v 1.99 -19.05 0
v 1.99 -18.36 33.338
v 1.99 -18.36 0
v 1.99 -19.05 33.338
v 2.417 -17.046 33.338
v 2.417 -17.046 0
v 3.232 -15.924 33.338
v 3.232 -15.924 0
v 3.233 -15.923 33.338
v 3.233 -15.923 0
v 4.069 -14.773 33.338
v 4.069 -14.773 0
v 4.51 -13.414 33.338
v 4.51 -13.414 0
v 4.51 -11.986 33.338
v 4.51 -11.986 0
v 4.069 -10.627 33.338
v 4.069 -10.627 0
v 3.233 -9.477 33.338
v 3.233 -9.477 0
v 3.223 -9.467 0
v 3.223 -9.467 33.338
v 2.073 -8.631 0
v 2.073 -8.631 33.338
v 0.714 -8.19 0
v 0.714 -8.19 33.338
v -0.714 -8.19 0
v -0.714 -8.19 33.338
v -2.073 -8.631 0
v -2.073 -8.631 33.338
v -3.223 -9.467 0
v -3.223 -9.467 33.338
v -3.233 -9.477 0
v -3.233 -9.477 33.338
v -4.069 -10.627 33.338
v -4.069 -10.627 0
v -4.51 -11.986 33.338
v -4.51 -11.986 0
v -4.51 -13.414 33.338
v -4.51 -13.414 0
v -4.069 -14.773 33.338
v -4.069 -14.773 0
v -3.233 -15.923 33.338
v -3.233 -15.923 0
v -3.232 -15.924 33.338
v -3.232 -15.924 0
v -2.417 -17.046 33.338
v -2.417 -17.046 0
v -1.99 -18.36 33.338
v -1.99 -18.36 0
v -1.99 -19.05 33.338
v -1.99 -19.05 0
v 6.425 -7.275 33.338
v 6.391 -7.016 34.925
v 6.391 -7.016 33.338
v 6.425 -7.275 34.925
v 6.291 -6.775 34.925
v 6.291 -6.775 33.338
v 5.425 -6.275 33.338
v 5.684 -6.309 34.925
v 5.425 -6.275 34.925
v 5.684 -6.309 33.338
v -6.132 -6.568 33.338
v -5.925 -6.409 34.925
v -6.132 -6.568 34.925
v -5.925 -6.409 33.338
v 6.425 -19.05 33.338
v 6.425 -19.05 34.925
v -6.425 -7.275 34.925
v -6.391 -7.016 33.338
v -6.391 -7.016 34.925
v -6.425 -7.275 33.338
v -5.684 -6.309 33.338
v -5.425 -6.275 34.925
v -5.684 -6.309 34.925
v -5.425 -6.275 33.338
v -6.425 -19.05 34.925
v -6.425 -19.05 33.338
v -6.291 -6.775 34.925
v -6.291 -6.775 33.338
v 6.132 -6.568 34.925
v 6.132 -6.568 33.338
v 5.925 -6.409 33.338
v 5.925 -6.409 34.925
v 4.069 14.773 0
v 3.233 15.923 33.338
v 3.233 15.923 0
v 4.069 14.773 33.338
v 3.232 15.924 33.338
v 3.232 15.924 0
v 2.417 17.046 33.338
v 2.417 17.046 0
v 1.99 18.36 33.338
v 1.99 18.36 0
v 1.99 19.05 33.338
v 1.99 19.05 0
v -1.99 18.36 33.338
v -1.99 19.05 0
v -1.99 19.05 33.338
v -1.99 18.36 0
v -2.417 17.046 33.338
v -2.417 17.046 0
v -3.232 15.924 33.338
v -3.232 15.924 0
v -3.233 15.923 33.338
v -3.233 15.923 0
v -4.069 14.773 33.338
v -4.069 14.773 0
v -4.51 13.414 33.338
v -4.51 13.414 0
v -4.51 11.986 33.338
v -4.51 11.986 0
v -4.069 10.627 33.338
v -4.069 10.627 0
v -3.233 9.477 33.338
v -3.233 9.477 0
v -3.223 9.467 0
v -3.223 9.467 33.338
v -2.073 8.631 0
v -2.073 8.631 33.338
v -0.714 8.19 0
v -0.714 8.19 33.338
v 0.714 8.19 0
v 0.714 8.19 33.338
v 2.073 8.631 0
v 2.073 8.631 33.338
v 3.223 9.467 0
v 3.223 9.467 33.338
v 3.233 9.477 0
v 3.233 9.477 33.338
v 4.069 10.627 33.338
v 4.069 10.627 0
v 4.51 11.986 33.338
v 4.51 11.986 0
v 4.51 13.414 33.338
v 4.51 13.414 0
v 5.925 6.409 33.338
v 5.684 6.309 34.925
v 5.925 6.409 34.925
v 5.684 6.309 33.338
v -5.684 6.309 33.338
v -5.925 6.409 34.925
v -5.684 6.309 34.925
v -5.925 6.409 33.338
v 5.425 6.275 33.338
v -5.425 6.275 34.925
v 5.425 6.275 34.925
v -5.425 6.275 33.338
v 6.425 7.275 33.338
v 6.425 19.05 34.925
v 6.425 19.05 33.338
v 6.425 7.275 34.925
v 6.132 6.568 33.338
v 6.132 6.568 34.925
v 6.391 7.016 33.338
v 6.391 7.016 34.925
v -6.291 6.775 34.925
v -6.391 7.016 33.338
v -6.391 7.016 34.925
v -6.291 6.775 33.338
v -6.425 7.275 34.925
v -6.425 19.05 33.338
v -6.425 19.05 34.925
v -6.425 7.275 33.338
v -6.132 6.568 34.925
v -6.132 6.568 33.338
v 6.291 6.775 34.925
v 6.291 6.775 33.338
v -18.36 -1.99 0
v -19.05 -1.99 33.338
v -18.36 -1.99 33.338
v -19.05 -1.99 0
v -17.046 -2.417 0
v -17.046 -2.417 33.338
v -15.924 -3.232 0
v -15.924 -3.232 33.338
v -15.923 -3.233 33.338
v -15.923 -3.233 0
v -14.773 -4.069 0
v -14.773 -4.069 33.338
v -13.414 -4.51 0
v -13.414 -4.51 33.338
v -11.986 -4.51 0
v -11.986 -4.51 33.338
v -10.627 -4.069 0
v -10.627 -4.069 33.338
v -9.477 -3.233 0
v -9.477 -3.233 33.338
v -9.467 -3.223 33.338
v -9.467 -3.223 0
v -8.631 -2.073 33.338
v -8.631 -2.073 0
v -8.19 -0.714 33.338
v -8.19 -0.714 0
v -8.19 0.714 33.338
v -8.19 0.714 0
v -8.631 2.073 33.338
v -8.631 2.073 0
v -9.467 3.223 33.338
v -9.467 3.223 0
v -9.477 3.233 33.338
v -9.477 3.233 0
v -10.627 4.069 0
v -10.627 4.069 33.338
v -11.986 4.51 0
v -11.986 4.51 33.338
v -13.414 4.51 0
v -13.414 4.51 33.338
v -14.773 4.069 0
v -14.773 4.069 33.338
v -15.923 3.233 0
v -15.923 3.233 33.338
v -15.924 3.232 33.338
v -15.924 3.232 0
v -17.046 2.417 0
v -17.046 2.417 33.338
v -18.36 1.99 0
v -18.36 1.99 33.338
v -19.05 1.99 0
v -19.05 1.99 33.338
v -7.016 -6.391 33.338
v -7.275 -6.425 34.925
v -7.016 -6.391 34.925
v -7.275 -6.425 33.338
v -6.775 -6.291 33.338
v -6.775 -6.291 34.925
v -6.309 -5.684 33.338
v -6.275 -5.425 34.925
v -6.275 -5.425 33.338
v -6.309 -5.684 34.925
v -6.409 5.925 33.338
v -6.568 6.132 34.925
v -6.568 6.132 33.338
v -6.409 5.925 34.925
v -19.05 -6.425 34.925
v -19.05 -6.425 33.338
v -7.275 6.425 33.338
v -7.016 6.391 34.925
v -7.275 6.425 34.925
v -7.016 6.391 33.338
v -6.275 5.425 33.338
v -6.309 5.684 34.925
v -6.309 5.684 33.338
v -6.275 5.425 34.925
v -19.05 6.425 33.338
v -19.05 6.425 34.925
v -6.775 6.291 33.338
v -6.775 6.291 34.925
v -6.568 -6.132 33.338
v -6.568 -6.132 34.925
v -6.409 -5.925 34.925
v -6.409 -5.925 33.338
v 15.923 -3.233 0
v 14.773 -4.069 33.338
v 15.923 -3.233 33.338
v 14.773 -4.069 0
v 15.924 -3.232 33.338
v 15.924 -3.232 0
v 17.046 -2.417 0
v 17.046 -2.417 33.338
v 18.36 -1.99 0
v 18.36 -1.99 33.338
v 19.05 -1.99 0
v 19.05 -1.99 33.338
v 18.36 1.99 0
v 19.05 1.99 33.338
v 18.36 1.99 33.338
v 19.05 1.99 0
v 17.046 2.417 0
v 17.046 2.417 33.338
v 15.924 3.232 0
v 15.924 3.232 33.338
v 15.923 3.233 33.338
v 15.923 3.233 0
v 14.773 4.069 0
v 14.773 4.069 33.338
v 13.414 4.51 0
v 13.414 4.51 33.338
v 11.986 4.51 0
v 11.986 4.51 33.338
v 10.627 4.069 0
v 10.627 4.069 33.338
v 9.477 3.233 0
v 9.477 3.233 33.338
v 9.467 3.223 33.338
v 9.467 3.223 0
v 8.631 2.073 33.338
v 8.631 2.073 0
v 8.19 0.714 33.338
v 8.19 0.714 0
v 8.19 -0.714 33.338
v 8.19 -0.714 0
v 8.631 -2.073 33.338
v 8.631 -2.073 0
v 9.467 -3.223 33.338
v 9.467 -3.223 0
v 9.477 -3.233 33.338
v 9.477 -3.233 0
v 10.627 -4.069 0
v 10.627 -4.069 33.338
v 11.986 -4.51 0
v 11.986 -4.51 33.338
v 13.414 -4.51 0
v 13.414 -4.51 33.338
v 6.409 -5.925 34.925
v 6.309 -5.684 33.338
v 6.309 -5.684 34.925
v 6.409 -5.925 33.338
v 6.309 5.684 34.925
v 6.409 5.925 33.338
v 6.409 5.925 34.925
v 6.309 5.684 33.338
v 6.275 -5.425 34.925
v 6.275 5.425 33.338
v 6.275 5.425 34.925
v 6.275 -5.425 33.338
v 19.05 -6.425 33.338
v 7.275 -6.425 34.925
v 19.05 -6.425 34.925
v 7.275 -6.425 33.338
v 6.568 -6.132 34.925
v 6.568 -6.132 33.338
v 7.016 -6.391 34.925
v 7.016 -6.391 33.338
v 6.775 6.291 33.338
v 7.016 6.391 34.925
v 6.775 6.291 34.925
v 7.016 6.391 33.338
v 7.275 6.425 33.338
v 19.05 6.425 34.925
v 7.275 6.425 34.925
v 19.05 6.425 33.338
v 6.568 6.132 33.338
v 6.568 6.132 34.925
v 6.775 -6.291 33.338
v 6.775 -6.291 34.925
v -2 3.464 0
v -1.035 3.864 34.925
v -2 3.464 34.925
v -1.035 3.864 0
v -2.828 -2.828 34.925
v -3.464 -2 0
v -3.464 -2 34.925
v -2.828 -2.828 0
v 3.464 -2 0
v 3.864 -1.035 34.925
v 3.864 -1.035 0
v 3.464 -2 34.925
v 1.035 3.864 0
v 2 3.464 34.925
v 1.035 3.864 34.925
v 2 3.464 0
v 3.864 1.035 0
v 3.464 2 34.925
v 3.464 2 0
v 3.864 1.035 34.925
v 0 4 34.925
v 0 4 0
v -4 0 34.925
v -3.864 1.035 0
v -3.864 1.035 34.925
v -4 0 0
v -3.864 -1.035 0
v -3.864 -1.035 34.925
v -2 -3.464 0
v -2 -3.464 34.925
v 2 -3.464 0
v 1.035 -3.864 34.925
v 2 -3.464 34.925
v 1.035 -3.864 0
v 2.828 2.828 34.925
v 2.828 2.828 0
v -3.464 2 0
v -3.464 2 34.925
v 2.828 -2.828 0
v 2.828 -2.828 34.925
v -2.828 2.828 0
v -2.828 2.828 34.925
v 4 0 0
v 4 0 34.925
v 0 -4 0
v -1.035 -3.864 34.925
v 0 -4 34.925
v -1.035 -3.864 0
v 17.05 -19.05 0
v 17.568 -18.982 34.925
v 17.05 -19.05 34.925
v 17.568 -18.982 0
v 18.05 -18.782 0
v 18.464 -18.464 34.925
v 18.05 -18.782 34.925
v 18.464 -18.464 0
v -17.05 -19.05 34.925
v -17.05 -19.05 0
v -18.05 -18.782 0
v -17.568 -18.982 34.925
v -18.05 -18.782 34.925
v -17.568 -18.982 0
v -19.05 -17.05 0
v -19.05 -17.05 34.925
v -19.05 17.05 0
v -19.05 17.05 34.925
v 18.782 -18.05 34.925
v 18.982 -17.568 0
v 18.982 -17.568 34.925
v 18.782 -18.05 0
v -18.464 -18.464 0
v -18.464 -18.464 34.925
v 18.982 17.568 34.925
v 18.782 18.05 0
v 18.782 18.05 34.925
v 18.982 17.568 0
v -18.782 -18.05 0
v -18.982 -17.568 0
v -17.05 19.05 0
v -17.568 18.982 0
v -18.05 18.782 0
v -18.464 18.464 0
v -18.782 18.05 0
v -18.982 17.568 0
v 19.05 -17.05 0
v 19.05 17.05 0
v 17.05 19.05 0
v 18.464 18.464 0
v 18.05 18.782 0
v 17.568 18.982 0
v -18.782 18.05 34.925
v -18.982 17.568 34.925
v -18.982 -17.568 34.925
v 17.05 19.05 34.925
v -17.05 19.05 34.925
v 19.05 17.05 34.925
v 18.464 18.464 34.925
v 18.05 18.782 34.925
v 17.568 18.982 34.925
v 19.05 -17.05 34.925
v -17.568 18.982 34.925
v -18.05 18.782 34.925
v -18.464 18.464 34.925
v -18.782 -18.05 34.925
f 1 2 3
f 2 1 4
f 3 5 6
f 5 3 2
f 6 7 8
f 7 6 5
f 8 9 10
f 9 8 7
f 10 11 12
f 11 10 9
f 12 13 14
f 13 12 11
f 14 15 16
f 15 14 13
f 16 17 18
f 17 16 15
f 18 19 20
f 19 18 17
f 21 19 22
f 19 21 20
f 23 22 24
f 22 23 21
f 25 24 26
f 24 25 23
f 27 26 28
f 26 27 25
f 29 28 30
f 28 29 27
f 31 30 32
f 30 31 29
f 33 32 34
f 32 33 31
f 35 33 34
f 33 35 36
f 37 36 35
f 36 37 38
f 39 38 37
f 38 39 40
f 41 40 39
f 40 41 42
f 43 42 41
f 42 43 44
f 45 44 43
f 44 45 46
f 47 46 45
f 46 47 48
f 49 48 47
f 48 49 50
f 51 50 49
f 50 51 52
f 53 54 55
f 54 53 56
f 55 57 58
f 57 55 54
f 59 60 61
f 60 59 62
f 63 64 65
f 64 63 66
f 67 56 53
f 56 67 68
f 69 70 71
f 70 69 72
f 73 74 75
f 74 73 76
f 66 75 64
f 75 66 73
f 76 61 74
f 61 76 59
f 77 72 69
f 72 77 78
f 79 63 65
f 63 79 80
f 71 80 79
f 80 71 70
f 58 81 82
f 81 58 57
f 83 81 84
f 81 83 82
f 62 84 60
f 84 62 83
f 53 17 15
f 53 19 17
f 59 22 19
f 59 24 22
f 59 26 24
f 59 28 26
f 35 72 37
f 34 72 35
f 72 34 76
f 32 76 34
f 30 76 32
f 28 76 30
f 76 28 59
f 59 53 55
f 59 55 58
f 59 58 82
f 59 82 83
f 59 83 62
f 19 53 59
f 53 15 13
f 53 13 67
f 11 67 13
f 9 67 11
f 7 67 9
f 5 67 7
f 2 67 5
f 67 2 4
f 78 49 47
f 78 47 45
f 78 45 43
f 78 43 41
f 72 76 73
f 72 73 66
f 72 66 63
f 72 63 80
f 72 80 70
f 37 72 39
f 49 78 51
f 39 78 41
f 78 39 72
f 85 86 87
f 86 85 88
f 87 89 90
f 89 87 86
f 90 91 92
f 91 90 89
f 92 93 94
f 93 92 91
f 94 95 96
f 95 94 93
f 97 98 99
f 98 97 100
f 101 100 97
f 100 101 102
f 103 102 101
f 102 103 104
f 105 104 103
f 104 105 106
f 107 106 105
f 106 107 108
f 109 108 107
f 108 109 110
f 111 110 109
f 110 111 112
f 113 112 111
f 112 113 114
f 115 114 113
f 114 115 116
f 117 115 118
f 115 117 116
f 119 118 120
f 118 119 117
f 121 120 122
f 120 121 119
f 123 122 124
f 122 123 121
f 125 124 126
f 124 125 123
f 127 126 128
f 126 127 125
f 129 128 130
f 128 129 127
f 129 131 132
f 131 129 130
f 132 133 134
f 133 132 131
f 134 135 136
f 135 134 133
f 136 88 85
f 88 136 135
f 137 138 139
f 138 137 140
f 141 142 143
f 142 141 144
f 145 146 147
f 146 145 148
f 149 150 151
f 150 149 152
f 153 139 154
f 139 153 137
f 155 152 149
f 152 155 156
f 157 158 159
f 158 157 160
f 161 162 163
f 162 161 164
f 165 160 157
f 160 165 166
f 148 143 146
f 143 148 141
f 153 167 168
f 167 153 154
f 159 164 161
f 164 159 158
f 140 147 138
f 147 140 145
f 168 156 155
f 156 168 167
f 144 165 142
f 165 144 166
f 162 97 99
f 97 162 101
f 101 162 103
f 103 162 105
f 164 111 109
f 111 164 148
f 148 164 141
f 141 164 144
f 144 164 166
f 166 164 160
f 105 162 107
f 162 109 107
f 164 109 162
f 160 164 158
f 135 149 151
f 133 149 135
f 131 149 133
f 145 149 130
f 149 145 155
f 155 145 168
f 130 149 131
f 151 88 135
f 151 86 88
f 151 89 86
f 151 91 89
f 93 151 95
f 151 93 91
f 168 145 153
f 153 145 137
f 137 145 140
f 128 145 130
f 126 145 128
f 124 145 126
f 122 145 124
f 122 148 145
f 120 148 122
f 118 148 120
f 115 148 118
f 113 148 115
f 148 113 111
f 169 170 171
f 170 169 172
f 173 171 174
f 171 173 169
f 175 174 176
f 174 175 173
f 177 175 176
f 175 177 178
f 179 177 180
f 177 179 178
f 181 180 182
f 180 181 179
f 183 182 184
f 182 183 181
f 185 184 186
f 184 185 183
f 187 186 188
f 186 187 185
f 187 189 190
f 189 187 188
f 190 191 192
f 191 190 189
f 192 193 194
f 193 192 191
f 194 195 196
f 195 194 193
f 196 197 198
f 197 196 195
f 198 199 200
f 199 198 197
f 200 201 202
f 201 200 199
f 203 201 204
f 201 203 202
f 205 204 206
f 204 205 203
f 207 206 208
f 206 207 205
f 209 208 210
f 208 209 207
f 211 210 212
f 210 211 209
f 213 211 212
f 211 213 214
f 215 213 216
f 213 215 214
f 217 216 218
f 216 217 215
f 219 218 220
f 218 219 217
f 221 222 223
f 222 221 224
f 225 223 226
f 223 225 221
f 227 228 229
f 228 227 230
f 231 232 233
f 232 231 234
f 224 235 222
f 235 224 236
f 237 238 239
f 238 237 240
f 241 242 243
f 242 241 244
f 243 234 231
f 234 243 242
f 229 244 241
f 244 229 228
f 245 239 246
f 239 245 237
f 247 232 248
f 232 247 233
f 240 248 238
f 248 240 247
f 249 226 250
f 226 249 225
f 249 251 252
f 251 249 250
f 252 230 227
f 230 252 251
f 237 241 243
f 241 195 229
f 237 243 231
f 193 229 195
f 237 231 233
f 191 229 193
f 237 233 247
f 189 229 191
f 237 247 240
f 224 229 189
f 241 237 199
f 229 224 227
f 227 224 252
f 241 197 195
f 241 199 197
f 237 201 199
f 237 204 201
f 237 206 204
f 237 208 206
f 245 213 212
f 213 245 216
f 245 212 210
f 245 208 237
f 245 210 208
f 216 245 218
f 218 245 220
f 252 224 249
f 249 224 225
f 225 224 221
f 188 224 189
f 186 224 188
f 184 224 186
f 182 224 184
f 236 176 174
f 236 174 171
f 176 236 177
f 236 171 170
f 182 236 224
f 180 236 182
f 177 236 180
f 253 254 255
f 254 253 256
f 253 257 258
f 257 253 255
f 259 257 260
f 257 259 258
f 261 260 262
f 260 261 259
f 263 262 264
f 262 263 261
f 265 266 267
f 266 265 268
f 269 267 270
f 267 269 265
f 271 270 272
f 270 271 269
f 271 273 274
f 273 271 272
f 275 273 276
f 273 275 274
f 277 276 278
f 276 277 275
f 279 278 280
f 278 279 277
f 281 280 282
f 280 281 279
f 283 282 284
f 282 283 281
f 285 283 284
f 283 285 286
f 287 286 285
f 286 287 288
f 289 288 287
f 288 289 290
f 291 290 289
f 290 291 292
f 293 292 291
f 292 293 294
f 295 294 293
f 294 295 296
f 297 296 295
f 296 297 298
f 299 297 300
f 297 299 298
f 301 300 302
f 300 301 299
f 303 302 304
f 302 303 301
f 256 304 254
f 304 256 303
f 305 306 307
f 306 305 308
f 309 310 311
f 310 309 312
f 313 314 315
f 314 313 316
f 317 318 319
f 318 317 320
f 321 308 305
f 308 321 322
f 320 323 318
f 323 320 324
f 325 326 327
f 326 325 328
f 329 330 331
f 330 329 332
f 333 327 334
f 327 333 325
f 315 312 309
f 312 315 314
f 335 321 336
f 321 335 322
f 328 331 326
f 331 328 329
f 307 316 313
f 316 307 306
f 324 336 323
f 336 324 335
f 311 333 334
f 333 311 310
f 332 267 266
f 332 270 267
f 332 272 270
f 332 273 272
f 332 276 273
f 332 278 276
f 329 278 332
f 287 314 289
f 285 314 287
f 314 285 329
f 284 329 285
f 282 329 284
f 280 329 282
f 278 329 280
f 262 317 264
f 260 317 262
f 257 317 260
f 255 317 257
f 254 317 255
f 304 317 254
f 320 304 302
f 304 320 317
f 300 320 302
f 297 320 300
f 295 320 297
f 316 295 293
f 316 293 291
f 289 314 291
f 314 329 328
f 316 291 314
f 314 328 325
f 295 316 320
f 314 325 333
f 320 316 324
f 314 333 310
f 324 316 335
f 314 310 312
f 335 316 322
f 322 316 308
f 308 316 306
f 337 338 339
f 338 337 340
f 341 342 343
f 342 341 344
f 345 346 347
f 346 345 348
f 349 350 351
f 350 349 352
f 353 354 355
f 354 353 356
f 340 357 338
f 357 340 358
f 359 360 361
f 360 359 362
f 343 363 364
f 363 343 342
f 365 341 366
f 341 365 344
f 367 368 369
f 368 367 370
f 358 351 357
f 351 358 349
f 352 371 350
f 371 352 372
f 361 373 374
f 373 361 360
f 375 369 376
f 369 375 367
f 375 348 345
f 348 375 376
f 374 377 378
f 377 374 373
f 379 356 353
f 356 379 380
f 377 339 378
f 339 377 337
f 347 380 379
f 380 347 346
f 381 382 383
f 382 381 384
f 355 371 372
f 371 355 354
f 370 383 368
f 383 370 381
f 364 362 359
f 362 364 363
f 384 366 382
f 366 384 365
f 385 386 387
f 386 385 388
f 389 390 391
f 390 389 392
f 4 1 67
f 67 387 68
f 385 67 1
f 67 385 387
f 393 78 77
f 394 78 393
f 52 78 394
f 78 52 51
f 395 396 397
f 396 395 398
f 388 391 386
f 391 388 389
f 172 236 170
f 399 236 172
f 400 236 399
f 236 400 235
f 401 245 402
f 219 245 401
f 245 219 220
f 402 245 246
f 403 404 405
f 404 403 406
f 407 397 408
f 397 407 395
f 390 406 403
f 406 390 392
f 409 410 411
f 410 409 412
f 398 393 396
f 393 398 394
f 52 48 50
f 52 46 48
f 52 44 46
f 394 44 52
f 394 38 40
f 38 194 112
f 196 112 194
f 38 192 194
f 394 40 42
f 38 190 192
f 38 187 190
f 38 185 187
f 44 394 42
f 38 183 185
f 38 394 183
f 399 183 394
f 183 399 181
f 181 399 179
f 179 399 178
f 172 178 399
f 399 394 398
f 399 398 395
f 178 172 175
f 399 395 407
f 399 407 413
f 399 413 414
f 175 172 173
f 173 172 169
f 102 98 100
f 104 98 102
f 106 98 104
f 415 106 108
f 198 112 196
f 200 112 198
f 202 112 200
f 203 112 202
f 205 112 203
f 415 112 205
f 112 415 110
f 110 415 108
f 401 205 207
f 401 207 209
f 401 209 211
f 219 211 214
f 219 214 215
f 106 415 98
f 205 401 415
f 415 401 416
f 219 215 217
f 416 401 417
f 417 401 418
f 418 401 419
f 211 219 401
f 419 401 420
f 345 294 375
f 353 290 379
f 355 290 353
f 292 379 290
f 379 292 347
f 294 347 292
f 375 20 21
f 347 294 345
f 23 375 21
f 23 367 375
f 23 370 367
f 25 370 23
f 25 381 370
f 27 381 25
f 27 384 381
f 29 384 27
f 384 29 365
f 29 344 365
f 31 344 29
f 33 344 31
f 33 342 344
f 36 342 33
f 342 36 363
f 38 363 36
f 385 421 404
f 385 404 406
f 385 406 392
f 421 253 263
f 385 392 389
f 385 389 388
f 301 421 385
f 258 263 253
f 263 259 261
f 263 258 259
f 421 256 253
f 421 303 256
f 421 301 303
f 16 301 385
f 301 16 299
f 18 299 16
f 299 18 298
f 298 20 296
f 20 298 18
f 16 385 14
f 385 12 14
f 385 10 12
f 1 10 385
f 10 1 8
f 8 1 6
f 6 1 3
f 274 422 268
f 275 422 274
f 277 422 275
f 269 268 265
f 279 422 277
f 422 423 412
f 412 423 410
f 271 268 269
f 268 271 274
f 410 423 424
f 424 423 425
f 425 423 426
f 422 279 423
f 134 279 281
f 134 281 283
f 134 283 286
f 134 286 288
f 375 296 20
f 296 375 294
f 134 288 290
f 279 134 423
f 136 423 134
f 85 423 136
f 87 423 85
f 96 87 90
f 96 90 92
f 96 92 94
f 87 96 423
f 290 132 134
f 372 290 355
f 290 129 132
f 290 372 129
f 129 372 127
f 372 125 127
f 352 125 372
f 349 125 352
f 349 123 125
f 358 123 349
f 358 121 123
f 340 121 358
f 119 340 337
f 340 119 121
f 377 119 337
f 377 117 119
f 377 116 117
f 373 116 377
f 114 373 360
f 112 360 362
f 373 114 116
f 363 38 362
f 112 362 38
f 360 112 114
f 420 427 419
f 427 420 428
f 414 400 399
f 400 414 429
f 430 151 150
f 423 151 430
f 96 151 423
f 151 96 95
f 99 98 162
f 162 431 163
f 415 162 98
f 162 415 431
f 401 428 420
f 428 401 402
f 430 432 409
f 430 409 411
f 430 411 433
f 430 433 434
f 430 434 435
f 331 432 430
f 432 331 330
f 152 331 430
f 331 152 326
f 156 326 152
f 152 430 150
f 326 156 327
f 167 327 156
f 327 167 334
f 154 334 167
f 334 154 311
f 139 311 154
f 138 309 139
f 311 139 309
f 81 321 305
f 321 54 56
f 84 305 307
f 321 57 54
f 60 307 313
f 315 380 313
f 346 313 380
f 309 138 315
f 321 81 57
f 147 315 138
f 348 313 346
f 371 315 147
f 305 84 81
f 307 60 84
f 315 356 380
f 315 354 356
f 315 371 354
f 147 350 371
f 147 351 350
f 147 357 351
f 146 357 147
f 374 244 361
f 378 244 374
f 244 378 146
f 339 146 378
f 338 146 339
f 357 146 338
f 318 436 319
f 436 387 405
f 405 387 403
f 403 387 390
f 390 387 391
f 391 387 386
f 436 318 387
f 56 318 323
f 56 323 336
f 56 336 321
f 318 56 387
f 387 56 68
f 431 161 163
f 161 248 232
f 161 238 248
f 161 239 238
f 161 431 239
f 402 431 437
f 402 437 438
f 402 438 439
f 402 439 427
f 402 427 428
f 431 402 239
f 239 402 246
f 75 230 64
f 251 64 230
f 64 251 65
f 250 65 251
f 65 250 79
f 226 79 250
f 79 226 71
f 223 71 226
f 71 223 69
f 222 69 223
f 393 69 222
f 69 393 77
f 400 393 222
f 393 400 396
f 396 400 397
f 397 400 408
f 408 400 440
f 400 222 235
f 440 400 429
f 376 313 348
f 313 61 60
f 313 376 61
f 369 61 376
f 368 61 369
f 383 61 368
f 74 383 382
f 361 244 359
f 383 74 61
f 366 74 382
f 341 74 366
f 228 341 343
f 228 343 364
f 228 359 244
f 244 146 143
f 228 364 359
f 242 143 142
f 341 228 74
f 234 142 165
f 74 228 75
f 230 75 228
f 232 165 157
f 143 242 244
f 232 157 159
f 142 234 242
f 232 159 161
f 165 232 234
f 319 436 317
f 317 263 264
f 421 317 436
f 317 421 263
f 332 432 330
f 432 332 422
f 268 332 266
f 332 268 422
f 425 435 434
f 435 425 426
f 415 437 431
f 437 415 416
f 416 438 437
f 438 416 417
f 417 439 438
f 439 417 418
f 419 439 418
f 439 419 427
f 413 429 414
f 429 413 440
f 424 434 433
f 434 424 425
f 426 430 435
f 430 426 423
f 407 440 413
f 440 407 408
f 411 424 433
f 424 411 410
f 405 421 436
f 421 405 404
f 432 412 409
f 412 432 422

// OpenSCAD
// LEDStripBeam1.3
// 
// Gridrail with:
// - One flat edge
// - Holes for both bolts and for T-nuts
// - Grooves for wires and/or string
// 
// Versions:
// v1.2:
// - Remove flat_edge_inset parameter, replace with height_u
// v1.3:
// - Make bowtie floor and hat thicknesses configurable.

size_chunks = [1,1];
height_u = 22;

bowtie_floor_thickness_u = 0;
bowtie_hat_thickness_u = 1;

hull_offset = -0.05;
bowtie_offset = -0.075;

$fn = 24;

use <../lib/RoundBowtie0.scad>
use <../lib/TGx11.1Lib.scad>
use <../lib/TOGridLib3.scad>
use <../lib/TOGPolyhedronLib1.scad>
use <../lib/TOGMod1.scad>
use <../lib/TOGMod1Constructors.scad>

$togridlib2_unit_table = tgx11_get_default_unit_table();

togmod1_domodule(
	let( chunk = togridlib3_decode([1, "chunk"]) )
	let( size_ca = [[size_chunks[0], "chunk"], [size_chunks[1], "chunk"], [height_u, "u"]] )
	let( size = togridlib3_decode_vector(size_ca) )
	let( bowtie_floor_thickness = togridlib3_decode([bowtie_floor_thickness_u,"u"]) )
	let( bowtie_hat_thickness   = togridlib3_decode([bowtie_hat_thickness_u  ,"u"]) )
	let( bowtie_cutout = ["union",
		togmod1_linear_extrude_z([
			bowtie_floor_thickness > 0 ? bowtie_floor_thickness : -1,
			size[2]+1
		], roundbowtie0_make_bowtie_2d(6.35, offset=-bowtie_offset)),
		
		if( bowtie_floor_thickness > 0 ) for(y=[-6.35,6.35])
			["translate", [y, 0, 0],
				togmod1_linear_extrude_z([-1, bowtie_floor_thickness+1], togmod1_make_circle(d=5))],
		if( bowtie_hat_thickness_u > 0 )
			["translate", [0,0,size[2]],
				tphl1_make_rounded_cuboid([25.4-bowtie_offset*2,12.7-bowtie_offset*2, bowtie_hat_thickness*2], r=[1,1,0])],
	])
	let( gridbeam_hole = tphl1_make_z_cylinder(zrange=[-1, size[2]+1], d=8) )
	["difference",
		togmod1_linear_extrude_z([0, size[2]],
			togmod1_make_rounded_rect(size, r=2)
		),
		
		for( cx=[-size_chunks[0]/2 + 0.5 : 1 : size_chunks[0]/2 - 0.5] )
		for( cy=[-size_chunks[1]/2, size_chunks[1]/2] )
		["translate", [cx*chunk, cy*chunk, 0], ["rotate", [0,0,90], bowtie_cutout]],

		for( cy=[-size_chunks[1]/2 + 0.5 : 1 : size_chunks[1]/2 - 0.5] )
		for( cx=[-size_chunks[0]/2, size_chunks[0]/2] )
		["translate", [cx*chunk, cy*chunk, 0], ["rotate", [0,0,0], bowtie_cutout]],

		for( cx=[-size_chunks[0]/2 + 0.5 : 1 : size_chunks[0]/2 - 0.5] )
		for( cy=[-size_chunks[1]/2 + 0.5 : 1 : size_chunks[1]/2 - 0.5] )
		["translate", [cx*chunk, cy*chunk, 0], gridbeam_hole],
	]
);
